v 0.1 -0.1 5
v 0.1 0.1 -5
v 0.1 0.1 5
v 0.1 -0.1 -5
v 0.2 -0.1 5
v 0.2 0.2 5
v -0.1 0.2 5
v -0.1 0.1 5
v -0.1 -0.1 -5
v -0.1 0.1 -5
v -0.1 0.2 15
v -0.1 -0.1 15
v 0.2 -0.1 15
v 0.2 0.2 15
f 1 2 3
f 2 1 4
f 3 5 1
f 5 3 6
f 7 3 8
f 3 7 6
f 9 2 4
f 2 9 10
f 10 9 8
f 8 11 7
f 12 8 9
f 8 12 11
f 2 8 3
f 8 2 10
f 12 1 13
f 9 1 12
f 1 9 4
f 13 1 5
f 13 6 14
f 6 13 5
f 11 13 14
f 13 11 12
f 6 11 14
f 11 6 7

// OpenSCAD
// file: definitions.scad
bwidth = 15;
bthickness = 1;

pbasewidth = 10;
pbwidth = 0.2;
ptwidth = 0.3;
pbspacing = ptwidth - pbwidth;

pheight = 10;
// main file
include <definitions.scad>

_v_offset = -pheight/2;
_h_offset = -pbwidth/2;

module pin()
{
    translate([_h_offset,_h_offset, 0])
    {
        translate([0, 0, _v_offset])
        {
            cube([pbwidth, pbwidth, pheight]);
        }
        translate([0, 0, -_v_offset])
        {
            cube([ptwidth, ptwidth, pheight]);
        }
    }
}

pin();
